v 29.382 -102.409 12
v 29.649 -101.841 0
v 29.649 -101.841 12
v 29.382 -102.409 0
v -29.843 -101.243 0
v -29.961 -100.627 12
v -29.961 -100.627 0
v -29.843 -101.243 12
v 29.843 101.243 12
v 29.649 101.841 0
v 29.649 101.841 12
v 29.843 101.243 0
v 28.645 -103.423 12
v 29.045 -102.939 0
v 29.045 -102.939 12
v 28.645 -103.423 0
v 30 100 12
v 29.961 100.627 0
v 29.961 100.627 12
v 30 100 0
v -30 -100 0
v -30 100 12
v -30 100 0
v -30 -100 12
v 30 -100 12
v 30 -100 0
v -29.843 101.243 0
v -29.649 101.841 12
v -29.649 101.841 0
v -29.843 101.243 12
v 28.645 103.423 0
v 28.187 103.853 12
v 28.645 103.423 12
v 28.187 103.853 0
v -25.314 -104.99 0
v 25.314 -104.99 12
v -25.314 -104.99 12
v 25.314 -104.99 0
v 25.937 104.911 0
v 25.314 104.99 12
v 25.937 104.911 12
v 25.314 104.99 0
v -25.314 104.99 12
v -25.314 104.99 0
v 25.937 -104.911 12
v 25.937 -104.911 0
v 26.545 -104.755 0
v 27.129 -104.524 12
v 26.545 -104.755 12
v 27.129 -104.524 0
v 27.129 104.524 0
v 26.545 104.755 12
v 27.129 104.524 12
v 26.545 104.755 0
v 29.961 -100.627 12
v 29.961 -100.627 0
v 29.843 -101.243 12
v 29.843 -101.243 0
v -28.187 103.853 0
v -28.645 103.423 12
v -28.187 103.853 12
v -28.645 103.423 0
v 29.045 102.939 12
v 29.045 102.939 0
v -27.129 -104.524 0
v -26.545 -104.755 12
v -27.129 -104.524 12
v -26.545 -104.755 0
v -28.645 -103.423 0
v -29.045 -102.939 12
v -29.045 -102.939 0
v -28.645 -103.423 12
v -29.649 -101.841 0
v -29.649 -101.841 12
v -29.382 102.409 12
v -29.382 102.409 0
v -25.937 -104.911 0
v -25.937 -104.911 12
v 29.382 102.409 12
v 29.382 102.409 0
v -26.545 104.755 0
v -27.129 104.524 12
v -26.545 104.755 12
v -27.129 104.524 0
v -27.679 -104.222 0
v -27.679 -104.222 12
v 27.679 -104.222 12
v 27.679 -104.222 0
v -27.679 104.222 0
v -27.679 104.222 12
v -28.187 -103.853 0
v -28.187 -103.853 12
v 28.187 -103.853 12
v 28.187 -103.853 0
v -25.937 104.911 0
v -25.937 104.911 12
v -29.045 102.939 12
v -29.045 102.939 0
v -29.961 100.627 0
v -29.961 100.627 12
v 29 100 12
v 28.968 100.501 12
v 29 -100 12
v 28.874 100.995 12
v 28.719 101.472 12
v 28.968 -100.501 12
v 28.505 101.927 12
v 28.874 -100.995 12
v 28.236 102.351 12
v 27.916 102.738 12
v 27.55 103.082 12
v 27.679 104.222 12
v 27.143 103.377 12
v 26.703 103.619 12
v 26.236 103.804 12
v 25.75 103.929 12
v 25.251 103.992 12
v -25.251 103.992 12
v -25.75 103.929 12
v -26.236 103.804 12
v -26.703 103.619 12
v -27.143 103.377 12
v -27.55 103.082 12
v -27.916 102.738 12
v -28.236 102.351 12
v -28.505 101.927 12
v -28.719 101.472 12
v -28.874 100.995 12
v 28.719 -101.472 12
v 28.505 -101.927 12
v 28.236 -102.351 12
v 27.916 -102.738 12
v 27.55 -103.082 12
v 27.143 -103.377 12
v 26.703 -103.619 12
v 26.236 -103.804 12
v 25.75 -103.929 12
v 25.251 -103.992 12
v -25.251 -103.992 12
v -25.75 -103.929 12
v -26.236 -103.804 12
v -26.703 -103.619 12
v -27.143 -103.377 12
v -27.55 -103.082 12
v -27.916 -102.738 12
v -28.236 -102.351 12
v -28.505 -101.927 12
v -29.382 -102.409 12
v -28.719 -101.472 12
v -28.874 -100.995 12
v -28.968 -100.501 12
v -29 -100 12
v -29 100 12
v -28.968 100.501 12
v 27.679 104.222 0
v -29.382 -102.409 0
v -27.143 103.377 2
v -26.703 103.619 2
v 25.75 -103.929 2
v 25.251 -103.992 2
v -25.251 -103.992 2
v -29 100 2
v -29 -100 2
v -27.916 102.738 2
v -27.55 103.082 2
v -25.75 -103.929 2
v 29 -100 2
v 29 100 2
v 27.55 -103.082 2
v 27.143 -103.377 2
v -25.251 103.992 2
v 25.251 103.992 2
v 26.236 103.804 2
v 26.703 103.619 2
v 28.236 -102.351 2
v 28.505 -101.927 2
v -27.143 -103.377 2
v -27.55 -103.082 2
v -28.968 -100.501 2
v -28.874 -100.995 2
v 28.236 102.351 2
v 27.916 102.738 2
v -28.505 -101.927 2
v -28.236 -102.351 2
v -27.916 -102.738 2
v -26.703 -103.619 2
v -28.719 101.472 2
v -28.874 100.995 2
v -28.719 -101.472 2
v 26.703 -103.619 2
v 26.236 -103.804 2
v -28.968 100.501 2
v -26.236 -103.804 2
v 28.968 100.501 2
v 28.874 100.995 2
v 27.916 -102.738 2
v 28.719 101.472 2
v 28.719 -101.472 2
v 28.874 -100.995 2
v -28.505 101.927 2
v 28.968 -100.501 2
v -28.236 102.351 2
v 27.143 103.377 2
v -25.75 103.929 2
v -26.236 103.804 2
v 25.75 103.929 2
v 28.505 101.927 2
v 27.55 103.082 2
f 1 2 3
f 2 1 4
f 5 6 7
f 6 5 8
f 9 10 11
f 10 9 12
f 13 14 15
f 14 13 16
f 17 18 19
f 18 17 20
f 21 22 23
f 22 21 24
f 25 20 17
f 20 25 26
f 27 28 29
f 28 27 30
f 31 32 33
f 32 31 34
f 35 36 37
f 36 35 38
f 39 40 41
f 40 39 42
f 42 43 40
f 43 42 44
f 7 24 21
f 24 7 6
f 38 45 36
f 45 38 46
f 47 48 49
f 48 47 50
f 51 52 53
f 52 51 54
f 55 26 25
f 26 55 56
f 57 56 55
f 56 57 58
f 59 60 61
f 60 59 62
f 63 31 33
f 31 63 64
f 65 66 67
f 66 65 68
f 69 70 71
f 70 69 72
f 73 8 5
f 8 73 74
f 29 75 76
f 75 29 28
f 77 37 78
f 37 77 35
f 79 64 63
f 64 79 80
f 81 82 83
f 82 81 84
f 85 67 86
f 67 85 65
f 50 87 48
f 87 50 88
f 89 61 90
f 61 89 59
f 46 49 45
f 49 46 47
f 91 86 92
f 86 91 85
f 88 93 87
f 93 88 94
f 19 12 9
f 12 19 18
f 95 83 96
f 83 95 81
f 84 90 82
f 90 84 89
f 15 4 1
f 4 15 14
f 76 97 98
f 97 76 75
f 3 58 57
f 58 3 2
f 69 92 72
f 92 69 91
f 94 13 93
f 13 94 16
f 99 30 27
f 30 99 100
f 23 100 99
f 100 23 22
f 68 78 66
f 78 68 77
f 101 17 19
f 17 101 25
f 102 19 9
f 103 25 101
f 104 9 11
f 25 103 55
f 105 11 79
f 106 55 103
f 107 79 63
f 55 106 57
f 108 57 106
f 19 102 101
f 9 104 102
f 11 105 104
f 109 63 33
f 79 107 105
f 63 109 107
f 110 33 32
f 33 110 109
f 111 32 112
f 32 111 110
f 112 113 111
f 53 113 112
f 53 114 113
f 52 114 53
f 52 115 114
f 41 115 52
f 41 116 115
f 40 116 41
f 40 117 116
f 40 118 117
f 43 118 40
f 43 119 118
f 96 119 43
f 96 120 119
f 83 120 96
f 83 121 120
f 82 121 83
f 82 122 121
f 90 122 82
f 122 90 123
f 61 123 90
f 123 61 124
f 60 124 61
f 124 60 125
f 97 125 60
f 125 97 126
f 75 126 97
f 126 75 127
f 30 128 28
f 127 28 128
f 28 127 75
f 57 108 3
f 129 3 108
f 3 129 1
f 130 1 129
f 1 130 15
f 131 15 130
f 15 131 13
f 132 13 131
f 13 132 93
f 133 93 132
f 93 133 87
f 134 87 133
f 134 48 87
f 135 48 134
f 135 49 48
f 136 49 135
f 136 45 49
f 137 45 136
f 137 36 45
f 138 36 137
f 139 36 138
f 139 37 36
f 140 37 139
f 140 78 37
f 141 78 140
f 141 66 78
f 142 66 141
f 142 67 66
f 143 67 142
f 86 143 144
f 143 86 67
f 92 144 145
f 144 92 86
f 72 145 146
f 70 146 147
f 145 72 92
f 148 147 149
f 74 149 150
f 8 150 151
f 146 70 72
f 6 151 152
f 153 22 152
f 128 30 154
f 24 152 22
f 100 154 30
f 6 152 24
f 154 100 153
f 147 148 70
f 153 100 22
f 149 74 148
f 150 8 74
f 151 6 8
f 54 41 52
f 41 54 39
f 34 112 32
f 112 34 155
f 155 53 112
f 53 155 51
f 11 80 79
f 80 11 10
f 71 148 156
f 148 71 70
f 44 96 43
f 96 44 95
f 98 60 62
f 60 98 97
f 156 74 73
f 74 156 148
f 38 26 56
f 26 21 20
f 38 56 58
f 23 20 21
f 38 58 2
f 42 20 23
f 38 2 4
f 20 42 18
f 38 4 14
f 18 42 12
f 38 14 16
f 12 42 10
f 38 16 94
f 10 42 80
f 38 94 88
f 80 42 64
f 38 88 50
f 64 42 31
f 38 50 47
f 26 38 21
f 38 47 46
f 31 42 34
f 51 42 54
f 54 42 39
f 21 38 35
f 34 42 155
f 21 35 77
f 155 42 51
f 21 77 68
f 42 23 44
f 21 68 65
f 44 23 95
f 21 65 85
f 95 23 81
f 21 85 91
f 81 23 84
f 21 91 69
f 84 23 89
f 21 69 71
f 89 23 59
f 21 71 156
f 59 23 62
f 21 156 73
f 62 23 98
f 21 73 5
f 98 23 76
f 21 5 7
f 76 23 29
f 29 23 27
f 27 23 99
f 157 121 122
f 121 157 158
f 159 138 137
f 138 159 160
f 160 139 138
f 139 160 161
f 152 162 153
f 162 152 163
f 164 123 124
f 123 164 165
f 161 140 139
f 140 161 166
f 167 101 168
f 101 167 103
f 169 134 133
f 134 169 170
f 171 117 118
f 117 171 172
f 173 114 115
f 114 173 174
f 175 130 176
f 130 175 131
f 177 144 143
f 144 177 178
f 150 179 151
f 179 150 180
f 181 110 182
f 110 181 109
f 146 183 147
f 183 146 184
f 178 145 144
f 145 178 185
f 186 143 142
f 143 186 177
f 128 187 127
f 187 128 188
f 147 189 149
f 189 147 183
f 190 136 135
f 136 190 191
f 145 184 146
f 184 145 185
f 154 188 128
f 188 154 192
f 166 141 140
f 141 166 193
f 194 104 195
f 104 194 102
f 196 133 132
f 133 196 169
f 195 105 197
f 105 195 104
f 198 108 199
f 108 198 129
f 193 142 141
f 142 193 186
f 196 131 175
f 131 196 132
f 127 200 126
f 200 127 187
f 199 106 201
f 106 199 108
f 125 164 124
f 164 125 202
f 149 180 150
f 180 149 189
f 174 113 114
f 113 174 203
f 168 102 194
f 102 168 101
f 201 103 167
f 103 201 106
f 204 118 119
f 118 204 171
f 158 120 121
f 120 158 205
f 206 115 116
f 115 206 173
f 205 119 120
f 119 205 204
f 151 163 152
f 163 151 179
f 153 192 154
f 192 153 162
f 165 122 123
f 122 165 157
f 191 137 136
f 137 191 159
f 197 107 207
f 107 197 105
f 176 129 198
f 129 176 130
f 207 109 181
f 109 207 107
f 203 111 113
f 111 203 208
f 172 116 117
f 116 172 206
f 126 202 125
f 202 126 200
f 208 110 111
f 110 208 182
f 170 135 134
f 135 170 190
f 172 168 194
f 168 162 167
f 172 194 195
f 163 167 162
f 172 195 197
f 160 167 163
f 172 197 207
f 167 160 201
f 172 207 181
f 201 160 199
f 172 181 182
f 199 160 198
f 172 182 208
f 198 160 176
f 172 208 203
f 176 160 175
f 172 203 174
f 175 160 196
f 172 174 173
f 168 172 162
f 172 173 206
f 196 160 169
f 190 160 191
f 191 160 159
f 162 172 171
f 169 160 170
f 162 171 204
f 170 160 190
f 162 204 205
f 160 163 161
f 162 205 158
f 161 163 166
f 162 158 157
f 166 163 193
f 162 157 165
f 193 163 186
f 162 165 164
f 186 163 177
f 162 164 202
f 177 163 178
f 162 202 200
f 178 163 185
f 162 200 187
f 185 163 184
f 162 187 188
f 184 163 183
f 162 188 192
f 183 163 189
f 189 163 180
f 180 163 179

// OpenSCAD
$fn = 50;


difference() {
	union() {
		hull() {
			translate(v = [-25.0000000000, 100.0000000000, 0]) {
				cylinder(h = 12, r = 5);
			}
			translate(v = [25.0000000000, 100.0000000000, 0]) {
				cylinder(h = 12, r = 5);
			}
			translate(v = [-25.0000000000, -100.0000000000, 0]) {
				cylinder(h = 12, r = 5);
			}
			translate(v = [25.0000000000, -100.0000000000, 0]) {
				cylinder(h = 12, r = 5);
			}
		}
	}
	union() {
		translate(v = [0, 0, 2]) {
			hull() {
				translate(v = [-25.0000000000, 100.0000000000, 0]) {
					cylinder(h = 10, r = 4);
				}
				translate(v = [25.0000000000, 100.0000000000, 0]) {
					cylinder(h = 10, r = 4);
				}
				translate(v = [-25.0000000000, -100.0000000000, 0]) {
					cylinder(h = 10, r = 4);
				}
				translate(v = [25.0000000000, -100.0000000000, 0]) {
					cylinder(h = 10, r = 4);
				}
			}
		}
	}
}
